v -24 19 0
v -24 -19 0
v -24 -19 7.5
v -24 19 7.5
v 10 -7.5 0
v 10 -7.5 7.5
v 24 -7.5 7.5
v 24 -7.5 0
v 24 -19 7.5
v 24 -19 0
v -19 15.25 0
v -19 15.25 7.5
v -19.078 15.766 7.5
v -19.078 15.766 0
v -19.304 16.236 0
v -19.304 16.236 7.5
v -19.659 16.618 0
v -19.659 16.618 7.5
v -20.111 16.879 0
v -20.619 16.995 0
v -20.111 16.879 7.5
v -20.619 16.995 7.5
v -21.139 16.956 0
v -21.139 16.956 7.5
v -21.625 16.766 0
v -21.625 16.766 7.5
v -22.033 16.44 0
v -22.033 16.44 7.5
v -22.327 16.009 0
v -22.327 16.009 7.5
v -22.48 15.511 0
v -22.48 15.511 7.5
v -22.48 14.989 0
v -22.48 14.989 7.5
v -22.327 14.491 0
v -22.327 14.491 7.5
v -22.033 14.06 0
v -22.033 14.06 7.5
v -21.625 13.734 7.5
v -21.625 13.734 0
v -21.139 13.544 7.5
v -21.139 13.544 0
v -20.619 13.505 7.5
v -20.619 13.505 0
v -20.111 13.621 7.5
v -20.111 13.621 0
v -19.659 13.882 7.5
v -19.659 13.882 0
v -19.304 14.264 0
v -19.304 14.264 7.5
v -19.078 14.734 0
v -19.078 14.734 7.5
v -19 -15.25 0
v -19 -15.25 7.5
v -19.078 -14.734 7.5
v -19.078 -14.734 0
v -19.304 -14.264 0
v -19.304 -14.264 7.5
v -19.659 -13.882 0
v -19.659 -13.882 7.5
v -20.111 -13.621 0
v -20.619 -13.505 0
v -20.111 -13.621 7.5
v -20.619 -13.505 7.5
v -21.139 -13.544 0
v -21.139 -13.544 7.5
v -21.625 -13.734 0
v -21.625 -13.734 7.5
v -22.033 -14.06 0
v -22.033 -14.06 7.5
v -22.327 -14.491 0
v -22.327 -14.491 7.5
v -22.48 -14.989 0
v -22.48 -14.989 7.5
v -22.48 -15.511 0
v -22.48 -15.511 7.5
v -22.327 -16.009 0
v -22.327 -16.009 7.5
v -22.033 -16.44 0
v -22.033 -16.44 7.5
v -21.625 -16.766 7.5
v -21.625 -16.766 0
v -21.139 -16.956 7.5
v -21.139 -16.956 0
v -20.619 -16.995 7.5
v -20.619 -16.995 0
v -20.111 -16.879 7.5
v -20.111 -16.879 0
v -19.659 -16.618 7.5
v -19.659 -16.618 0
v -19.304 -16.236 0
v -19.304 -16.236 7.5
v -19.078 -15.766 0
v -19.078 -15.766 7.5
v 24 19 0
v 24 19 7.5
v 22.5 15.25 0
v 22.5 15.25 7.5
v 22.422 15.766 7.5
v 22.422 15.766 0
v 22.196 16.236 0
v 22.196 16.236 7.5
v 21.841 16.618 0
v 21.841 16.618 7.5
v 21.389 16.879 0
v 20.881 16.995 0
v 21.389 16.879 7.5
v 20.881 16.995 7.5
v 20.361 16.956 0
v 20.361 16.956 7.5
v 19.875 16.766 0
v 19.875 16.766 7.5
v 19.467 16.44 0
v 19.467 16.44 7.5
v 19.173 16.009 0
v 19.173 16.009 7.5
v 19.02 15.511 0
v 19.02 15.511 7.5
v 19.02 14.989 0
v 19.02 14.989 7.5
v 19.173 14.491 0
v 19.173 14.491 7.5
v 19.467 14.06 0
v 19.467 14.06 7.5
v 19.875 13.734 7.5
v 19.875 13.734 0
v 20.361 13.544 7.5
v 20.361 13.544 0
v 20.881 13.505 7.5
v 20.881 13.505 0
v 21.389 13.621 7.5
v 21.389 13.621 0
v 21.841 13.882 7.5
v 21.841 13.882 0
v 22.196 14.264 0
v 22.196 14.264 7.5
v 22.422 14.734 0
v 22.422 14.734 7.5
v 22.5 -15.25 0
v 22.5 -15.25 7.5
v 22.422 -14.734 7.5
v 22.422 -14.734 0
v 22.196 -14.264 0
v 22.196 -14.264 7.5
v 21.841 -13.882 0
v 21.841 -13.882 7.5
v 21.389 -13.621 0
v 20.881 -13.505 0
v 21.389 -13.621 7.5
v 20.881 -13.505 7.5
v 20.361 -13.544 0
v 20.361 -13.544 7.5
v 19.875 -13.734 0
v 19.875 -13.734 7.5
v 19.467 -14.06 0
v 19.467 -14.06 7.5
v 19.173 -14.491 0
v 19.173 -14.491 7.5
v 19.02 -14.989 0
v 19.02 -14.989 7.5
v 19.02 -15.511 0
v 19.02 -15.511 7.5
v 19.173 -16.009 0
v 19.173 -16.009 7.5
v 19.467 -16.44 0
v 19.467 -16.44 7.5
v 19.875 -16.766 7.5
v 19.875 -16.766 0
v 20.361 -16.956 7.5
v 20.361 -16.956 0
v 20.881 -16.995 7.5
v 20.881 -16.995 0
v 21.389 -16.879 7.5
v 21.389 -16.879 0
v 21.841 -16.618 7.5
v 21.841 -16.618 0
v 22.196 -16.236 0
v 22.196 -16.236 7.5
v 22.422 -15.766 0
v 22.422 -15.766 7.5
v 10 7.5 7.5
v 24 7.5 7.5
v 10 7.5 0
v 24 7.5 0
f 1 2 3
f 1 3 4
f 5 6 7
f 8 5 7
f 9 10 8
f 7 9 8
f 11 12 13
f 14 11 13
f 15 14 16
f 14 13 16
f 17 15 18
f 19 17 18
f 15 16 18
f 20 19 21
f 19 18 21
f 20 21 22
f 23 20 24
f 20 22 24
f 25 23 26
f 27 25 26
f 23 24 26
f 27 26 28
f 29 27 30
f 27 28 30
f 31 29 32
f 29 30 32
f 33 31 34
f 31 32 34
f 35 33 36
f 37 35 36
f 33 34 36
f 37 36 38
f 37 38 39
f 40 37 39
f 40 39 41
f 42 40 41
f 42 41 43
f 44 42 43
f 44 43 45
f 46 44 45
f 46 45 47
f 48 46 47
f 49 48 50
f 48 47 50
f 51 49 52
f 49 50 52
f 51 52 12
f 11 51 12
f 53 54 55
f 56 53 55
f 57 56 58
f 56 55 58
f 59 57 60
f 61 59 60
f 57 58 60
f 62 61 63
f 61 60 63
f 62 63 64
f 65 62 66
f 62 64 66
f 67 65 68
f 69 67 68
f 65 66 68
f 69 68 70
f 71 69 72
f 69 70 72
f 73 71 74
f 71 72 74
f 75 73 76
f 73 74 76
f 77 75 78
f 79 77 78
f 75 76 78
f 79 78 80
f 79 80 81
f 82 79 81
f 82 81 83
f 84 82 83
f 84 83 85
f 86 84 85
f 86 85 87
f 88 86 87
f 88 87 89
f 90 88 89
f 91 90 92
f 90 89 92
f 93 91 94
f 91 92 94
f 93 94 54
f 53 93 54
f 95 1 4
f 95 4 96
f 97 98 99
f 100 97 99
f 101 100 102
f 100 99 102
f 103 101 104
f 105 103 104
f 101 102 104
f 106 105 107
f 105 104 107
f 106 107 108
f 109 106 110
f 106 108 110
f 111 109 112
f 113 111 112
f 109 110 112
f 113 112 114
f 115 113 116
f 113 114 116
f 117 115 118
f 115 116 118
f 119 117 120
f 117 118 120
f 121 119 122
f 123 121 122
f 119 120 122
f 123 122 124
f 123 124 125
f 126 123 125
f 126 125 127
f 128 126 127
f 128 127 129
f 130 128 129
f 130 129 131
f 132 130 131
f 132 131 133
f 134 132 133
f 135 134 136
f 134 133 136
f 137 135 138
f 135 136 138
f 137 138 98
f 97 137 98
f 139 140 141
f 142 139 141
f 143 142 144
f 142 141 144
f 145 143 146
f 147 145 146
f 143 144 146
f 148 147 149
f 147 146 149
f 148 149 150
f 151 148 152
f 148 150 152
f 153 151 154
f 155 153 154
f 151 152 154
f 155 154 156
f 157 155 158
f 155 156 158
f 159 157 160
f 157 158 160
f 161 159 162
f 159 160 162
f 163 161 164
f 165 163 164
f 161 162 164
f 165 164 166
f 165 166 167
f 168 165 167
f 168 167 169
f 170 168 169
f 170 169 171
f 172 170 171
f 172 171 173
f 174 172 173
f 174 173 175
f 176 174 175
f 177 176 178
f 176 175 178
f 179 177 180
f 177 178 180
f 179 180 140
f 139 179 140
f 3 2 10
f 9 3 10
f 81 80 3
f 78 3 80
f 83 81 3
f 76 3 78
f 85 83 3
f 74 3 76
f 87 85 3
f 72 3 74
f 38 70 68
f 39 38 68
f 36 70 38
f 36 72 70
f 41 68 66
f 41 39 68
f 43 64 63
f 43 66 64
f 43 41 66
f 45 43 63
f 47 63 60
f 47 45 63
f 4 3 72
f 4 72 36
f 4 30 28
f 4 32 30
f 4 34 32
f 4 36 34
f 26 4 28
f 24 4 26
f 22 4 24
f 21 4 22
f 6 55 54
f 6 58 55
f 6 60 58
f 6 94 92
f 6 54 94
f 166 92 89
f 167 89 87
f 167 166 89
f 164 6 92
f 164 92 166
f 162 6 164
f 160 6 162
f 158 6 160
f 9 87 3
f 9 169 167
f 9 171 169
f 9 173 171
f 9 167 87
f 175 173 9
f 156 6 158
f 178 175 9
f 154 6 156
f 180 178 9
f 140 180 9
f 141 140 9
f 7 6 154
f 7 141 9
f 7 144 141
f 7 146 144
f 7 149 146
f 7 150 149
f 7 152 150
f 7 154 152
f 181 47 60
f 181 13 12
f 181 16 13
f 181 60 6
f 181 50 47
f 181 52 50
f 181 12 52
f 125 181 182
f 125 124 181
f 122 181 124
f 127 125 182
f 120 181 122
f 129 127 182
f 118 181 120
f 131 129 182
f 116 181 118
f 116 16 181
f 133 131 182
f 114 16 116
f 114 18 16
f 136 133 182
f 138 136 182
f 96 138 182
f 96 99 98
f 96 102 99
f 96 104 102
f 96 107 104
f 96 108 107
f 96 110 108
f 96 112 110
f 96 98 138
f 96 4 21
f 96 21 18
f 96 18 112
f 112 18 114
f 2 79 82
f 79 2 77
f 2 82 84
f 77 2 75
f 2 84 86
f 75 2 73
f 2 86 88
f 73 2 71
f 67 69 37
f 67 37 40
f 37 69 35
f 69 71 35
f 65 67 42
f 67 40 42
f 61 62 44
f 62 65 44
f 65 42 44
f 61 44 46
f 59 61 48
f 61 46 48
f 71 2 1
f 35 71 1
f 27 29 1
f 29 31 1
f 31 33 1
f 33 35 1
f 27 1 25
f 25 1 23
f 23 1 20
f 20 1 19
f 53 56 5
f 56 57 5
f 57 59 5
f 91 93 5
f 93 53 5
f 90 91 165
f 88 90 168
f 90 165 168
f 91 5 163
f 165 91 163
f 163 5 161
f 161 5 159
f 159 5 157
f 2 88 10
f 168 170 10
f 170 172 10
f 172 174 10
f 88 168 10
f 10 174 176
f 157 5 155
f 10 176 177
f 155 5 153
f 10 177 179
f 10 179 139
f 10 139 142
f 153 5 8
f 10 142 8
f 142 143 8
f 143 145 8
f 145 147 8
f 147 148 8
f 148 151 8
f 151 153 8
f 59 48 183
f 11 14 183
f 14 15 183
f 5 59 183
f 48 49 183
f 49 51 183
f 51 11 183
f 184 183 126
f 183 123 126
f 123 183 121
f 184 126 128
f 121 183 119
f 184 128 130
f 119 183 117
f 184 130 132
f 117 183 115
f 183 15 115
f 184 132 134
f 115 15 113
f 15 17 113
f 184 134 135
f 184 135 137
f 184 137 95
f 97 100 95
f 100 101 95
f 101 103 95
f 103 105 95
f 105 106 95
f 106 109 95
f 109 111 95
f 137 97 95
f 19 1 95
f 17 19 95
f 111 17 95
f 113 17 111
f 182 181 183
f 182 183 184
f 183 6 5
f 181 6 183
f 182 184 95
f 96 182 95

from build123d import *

# Parameters (mm, degrees)
ESQUISSE1_W             = 48
ESQUISSE1_H             = 38
BOSS_EXTRU_1_DEPTH      = 7.5
ESQUISSE2_R             = 1.75
ENL_V_MAT_EXTRU_1_DEPTH = 7.5
ESQUISSE4_W             = 14
ESQUISSE4_H             = 15
ENL_V_MAT_EXTRU_2_DEPTH = 7.5


with BuildPart() as part:
    # Esquisse1 → Boss.-Extru.1 (new body)
    with BuildSketch(Plane.XY):
        Rectangle(ESQUISSE1_W, ESQUISSE1_H)
    extrude(amount=BOSS_EXTRU_1_DEPTH)

    # Esquisse2 → Enlèv. mat.-Extru.1 (cut)
    with BuildSketch(Plane.XY.offset(7.5)):
        with Locations((20.75, 15.25)):
            Circle(ESQUISSE2_R)
        with Locations((-20.75, 15.25)):
            Circle(ESQUISSE2_R)
        with Locations((20.75, -15.25)):
            Circle(ESQUISSE2_R)
        with Locations((-20.75, -15.25)):
            Circle(ESQUISSE2_R)
    extrude(amount=-ENL_V_MAT_EXTRU_1_DEPTH, mode=Mode.SUBTRACT)

    # Esquisse4 → Enlèv. mat.-Extru.2 (cut)
    with BuildSketch(Plane.XY.offset(7.5)):
        with Locations((17, 0)):
            Rectangle(ESQUISSE4_W, ESQUISSE4_H)
    extrude(amount=-ENL_V_MAT_EXTRU_2_DEPTH, mode=Mode.SUBTRACT)


solid = part.part
